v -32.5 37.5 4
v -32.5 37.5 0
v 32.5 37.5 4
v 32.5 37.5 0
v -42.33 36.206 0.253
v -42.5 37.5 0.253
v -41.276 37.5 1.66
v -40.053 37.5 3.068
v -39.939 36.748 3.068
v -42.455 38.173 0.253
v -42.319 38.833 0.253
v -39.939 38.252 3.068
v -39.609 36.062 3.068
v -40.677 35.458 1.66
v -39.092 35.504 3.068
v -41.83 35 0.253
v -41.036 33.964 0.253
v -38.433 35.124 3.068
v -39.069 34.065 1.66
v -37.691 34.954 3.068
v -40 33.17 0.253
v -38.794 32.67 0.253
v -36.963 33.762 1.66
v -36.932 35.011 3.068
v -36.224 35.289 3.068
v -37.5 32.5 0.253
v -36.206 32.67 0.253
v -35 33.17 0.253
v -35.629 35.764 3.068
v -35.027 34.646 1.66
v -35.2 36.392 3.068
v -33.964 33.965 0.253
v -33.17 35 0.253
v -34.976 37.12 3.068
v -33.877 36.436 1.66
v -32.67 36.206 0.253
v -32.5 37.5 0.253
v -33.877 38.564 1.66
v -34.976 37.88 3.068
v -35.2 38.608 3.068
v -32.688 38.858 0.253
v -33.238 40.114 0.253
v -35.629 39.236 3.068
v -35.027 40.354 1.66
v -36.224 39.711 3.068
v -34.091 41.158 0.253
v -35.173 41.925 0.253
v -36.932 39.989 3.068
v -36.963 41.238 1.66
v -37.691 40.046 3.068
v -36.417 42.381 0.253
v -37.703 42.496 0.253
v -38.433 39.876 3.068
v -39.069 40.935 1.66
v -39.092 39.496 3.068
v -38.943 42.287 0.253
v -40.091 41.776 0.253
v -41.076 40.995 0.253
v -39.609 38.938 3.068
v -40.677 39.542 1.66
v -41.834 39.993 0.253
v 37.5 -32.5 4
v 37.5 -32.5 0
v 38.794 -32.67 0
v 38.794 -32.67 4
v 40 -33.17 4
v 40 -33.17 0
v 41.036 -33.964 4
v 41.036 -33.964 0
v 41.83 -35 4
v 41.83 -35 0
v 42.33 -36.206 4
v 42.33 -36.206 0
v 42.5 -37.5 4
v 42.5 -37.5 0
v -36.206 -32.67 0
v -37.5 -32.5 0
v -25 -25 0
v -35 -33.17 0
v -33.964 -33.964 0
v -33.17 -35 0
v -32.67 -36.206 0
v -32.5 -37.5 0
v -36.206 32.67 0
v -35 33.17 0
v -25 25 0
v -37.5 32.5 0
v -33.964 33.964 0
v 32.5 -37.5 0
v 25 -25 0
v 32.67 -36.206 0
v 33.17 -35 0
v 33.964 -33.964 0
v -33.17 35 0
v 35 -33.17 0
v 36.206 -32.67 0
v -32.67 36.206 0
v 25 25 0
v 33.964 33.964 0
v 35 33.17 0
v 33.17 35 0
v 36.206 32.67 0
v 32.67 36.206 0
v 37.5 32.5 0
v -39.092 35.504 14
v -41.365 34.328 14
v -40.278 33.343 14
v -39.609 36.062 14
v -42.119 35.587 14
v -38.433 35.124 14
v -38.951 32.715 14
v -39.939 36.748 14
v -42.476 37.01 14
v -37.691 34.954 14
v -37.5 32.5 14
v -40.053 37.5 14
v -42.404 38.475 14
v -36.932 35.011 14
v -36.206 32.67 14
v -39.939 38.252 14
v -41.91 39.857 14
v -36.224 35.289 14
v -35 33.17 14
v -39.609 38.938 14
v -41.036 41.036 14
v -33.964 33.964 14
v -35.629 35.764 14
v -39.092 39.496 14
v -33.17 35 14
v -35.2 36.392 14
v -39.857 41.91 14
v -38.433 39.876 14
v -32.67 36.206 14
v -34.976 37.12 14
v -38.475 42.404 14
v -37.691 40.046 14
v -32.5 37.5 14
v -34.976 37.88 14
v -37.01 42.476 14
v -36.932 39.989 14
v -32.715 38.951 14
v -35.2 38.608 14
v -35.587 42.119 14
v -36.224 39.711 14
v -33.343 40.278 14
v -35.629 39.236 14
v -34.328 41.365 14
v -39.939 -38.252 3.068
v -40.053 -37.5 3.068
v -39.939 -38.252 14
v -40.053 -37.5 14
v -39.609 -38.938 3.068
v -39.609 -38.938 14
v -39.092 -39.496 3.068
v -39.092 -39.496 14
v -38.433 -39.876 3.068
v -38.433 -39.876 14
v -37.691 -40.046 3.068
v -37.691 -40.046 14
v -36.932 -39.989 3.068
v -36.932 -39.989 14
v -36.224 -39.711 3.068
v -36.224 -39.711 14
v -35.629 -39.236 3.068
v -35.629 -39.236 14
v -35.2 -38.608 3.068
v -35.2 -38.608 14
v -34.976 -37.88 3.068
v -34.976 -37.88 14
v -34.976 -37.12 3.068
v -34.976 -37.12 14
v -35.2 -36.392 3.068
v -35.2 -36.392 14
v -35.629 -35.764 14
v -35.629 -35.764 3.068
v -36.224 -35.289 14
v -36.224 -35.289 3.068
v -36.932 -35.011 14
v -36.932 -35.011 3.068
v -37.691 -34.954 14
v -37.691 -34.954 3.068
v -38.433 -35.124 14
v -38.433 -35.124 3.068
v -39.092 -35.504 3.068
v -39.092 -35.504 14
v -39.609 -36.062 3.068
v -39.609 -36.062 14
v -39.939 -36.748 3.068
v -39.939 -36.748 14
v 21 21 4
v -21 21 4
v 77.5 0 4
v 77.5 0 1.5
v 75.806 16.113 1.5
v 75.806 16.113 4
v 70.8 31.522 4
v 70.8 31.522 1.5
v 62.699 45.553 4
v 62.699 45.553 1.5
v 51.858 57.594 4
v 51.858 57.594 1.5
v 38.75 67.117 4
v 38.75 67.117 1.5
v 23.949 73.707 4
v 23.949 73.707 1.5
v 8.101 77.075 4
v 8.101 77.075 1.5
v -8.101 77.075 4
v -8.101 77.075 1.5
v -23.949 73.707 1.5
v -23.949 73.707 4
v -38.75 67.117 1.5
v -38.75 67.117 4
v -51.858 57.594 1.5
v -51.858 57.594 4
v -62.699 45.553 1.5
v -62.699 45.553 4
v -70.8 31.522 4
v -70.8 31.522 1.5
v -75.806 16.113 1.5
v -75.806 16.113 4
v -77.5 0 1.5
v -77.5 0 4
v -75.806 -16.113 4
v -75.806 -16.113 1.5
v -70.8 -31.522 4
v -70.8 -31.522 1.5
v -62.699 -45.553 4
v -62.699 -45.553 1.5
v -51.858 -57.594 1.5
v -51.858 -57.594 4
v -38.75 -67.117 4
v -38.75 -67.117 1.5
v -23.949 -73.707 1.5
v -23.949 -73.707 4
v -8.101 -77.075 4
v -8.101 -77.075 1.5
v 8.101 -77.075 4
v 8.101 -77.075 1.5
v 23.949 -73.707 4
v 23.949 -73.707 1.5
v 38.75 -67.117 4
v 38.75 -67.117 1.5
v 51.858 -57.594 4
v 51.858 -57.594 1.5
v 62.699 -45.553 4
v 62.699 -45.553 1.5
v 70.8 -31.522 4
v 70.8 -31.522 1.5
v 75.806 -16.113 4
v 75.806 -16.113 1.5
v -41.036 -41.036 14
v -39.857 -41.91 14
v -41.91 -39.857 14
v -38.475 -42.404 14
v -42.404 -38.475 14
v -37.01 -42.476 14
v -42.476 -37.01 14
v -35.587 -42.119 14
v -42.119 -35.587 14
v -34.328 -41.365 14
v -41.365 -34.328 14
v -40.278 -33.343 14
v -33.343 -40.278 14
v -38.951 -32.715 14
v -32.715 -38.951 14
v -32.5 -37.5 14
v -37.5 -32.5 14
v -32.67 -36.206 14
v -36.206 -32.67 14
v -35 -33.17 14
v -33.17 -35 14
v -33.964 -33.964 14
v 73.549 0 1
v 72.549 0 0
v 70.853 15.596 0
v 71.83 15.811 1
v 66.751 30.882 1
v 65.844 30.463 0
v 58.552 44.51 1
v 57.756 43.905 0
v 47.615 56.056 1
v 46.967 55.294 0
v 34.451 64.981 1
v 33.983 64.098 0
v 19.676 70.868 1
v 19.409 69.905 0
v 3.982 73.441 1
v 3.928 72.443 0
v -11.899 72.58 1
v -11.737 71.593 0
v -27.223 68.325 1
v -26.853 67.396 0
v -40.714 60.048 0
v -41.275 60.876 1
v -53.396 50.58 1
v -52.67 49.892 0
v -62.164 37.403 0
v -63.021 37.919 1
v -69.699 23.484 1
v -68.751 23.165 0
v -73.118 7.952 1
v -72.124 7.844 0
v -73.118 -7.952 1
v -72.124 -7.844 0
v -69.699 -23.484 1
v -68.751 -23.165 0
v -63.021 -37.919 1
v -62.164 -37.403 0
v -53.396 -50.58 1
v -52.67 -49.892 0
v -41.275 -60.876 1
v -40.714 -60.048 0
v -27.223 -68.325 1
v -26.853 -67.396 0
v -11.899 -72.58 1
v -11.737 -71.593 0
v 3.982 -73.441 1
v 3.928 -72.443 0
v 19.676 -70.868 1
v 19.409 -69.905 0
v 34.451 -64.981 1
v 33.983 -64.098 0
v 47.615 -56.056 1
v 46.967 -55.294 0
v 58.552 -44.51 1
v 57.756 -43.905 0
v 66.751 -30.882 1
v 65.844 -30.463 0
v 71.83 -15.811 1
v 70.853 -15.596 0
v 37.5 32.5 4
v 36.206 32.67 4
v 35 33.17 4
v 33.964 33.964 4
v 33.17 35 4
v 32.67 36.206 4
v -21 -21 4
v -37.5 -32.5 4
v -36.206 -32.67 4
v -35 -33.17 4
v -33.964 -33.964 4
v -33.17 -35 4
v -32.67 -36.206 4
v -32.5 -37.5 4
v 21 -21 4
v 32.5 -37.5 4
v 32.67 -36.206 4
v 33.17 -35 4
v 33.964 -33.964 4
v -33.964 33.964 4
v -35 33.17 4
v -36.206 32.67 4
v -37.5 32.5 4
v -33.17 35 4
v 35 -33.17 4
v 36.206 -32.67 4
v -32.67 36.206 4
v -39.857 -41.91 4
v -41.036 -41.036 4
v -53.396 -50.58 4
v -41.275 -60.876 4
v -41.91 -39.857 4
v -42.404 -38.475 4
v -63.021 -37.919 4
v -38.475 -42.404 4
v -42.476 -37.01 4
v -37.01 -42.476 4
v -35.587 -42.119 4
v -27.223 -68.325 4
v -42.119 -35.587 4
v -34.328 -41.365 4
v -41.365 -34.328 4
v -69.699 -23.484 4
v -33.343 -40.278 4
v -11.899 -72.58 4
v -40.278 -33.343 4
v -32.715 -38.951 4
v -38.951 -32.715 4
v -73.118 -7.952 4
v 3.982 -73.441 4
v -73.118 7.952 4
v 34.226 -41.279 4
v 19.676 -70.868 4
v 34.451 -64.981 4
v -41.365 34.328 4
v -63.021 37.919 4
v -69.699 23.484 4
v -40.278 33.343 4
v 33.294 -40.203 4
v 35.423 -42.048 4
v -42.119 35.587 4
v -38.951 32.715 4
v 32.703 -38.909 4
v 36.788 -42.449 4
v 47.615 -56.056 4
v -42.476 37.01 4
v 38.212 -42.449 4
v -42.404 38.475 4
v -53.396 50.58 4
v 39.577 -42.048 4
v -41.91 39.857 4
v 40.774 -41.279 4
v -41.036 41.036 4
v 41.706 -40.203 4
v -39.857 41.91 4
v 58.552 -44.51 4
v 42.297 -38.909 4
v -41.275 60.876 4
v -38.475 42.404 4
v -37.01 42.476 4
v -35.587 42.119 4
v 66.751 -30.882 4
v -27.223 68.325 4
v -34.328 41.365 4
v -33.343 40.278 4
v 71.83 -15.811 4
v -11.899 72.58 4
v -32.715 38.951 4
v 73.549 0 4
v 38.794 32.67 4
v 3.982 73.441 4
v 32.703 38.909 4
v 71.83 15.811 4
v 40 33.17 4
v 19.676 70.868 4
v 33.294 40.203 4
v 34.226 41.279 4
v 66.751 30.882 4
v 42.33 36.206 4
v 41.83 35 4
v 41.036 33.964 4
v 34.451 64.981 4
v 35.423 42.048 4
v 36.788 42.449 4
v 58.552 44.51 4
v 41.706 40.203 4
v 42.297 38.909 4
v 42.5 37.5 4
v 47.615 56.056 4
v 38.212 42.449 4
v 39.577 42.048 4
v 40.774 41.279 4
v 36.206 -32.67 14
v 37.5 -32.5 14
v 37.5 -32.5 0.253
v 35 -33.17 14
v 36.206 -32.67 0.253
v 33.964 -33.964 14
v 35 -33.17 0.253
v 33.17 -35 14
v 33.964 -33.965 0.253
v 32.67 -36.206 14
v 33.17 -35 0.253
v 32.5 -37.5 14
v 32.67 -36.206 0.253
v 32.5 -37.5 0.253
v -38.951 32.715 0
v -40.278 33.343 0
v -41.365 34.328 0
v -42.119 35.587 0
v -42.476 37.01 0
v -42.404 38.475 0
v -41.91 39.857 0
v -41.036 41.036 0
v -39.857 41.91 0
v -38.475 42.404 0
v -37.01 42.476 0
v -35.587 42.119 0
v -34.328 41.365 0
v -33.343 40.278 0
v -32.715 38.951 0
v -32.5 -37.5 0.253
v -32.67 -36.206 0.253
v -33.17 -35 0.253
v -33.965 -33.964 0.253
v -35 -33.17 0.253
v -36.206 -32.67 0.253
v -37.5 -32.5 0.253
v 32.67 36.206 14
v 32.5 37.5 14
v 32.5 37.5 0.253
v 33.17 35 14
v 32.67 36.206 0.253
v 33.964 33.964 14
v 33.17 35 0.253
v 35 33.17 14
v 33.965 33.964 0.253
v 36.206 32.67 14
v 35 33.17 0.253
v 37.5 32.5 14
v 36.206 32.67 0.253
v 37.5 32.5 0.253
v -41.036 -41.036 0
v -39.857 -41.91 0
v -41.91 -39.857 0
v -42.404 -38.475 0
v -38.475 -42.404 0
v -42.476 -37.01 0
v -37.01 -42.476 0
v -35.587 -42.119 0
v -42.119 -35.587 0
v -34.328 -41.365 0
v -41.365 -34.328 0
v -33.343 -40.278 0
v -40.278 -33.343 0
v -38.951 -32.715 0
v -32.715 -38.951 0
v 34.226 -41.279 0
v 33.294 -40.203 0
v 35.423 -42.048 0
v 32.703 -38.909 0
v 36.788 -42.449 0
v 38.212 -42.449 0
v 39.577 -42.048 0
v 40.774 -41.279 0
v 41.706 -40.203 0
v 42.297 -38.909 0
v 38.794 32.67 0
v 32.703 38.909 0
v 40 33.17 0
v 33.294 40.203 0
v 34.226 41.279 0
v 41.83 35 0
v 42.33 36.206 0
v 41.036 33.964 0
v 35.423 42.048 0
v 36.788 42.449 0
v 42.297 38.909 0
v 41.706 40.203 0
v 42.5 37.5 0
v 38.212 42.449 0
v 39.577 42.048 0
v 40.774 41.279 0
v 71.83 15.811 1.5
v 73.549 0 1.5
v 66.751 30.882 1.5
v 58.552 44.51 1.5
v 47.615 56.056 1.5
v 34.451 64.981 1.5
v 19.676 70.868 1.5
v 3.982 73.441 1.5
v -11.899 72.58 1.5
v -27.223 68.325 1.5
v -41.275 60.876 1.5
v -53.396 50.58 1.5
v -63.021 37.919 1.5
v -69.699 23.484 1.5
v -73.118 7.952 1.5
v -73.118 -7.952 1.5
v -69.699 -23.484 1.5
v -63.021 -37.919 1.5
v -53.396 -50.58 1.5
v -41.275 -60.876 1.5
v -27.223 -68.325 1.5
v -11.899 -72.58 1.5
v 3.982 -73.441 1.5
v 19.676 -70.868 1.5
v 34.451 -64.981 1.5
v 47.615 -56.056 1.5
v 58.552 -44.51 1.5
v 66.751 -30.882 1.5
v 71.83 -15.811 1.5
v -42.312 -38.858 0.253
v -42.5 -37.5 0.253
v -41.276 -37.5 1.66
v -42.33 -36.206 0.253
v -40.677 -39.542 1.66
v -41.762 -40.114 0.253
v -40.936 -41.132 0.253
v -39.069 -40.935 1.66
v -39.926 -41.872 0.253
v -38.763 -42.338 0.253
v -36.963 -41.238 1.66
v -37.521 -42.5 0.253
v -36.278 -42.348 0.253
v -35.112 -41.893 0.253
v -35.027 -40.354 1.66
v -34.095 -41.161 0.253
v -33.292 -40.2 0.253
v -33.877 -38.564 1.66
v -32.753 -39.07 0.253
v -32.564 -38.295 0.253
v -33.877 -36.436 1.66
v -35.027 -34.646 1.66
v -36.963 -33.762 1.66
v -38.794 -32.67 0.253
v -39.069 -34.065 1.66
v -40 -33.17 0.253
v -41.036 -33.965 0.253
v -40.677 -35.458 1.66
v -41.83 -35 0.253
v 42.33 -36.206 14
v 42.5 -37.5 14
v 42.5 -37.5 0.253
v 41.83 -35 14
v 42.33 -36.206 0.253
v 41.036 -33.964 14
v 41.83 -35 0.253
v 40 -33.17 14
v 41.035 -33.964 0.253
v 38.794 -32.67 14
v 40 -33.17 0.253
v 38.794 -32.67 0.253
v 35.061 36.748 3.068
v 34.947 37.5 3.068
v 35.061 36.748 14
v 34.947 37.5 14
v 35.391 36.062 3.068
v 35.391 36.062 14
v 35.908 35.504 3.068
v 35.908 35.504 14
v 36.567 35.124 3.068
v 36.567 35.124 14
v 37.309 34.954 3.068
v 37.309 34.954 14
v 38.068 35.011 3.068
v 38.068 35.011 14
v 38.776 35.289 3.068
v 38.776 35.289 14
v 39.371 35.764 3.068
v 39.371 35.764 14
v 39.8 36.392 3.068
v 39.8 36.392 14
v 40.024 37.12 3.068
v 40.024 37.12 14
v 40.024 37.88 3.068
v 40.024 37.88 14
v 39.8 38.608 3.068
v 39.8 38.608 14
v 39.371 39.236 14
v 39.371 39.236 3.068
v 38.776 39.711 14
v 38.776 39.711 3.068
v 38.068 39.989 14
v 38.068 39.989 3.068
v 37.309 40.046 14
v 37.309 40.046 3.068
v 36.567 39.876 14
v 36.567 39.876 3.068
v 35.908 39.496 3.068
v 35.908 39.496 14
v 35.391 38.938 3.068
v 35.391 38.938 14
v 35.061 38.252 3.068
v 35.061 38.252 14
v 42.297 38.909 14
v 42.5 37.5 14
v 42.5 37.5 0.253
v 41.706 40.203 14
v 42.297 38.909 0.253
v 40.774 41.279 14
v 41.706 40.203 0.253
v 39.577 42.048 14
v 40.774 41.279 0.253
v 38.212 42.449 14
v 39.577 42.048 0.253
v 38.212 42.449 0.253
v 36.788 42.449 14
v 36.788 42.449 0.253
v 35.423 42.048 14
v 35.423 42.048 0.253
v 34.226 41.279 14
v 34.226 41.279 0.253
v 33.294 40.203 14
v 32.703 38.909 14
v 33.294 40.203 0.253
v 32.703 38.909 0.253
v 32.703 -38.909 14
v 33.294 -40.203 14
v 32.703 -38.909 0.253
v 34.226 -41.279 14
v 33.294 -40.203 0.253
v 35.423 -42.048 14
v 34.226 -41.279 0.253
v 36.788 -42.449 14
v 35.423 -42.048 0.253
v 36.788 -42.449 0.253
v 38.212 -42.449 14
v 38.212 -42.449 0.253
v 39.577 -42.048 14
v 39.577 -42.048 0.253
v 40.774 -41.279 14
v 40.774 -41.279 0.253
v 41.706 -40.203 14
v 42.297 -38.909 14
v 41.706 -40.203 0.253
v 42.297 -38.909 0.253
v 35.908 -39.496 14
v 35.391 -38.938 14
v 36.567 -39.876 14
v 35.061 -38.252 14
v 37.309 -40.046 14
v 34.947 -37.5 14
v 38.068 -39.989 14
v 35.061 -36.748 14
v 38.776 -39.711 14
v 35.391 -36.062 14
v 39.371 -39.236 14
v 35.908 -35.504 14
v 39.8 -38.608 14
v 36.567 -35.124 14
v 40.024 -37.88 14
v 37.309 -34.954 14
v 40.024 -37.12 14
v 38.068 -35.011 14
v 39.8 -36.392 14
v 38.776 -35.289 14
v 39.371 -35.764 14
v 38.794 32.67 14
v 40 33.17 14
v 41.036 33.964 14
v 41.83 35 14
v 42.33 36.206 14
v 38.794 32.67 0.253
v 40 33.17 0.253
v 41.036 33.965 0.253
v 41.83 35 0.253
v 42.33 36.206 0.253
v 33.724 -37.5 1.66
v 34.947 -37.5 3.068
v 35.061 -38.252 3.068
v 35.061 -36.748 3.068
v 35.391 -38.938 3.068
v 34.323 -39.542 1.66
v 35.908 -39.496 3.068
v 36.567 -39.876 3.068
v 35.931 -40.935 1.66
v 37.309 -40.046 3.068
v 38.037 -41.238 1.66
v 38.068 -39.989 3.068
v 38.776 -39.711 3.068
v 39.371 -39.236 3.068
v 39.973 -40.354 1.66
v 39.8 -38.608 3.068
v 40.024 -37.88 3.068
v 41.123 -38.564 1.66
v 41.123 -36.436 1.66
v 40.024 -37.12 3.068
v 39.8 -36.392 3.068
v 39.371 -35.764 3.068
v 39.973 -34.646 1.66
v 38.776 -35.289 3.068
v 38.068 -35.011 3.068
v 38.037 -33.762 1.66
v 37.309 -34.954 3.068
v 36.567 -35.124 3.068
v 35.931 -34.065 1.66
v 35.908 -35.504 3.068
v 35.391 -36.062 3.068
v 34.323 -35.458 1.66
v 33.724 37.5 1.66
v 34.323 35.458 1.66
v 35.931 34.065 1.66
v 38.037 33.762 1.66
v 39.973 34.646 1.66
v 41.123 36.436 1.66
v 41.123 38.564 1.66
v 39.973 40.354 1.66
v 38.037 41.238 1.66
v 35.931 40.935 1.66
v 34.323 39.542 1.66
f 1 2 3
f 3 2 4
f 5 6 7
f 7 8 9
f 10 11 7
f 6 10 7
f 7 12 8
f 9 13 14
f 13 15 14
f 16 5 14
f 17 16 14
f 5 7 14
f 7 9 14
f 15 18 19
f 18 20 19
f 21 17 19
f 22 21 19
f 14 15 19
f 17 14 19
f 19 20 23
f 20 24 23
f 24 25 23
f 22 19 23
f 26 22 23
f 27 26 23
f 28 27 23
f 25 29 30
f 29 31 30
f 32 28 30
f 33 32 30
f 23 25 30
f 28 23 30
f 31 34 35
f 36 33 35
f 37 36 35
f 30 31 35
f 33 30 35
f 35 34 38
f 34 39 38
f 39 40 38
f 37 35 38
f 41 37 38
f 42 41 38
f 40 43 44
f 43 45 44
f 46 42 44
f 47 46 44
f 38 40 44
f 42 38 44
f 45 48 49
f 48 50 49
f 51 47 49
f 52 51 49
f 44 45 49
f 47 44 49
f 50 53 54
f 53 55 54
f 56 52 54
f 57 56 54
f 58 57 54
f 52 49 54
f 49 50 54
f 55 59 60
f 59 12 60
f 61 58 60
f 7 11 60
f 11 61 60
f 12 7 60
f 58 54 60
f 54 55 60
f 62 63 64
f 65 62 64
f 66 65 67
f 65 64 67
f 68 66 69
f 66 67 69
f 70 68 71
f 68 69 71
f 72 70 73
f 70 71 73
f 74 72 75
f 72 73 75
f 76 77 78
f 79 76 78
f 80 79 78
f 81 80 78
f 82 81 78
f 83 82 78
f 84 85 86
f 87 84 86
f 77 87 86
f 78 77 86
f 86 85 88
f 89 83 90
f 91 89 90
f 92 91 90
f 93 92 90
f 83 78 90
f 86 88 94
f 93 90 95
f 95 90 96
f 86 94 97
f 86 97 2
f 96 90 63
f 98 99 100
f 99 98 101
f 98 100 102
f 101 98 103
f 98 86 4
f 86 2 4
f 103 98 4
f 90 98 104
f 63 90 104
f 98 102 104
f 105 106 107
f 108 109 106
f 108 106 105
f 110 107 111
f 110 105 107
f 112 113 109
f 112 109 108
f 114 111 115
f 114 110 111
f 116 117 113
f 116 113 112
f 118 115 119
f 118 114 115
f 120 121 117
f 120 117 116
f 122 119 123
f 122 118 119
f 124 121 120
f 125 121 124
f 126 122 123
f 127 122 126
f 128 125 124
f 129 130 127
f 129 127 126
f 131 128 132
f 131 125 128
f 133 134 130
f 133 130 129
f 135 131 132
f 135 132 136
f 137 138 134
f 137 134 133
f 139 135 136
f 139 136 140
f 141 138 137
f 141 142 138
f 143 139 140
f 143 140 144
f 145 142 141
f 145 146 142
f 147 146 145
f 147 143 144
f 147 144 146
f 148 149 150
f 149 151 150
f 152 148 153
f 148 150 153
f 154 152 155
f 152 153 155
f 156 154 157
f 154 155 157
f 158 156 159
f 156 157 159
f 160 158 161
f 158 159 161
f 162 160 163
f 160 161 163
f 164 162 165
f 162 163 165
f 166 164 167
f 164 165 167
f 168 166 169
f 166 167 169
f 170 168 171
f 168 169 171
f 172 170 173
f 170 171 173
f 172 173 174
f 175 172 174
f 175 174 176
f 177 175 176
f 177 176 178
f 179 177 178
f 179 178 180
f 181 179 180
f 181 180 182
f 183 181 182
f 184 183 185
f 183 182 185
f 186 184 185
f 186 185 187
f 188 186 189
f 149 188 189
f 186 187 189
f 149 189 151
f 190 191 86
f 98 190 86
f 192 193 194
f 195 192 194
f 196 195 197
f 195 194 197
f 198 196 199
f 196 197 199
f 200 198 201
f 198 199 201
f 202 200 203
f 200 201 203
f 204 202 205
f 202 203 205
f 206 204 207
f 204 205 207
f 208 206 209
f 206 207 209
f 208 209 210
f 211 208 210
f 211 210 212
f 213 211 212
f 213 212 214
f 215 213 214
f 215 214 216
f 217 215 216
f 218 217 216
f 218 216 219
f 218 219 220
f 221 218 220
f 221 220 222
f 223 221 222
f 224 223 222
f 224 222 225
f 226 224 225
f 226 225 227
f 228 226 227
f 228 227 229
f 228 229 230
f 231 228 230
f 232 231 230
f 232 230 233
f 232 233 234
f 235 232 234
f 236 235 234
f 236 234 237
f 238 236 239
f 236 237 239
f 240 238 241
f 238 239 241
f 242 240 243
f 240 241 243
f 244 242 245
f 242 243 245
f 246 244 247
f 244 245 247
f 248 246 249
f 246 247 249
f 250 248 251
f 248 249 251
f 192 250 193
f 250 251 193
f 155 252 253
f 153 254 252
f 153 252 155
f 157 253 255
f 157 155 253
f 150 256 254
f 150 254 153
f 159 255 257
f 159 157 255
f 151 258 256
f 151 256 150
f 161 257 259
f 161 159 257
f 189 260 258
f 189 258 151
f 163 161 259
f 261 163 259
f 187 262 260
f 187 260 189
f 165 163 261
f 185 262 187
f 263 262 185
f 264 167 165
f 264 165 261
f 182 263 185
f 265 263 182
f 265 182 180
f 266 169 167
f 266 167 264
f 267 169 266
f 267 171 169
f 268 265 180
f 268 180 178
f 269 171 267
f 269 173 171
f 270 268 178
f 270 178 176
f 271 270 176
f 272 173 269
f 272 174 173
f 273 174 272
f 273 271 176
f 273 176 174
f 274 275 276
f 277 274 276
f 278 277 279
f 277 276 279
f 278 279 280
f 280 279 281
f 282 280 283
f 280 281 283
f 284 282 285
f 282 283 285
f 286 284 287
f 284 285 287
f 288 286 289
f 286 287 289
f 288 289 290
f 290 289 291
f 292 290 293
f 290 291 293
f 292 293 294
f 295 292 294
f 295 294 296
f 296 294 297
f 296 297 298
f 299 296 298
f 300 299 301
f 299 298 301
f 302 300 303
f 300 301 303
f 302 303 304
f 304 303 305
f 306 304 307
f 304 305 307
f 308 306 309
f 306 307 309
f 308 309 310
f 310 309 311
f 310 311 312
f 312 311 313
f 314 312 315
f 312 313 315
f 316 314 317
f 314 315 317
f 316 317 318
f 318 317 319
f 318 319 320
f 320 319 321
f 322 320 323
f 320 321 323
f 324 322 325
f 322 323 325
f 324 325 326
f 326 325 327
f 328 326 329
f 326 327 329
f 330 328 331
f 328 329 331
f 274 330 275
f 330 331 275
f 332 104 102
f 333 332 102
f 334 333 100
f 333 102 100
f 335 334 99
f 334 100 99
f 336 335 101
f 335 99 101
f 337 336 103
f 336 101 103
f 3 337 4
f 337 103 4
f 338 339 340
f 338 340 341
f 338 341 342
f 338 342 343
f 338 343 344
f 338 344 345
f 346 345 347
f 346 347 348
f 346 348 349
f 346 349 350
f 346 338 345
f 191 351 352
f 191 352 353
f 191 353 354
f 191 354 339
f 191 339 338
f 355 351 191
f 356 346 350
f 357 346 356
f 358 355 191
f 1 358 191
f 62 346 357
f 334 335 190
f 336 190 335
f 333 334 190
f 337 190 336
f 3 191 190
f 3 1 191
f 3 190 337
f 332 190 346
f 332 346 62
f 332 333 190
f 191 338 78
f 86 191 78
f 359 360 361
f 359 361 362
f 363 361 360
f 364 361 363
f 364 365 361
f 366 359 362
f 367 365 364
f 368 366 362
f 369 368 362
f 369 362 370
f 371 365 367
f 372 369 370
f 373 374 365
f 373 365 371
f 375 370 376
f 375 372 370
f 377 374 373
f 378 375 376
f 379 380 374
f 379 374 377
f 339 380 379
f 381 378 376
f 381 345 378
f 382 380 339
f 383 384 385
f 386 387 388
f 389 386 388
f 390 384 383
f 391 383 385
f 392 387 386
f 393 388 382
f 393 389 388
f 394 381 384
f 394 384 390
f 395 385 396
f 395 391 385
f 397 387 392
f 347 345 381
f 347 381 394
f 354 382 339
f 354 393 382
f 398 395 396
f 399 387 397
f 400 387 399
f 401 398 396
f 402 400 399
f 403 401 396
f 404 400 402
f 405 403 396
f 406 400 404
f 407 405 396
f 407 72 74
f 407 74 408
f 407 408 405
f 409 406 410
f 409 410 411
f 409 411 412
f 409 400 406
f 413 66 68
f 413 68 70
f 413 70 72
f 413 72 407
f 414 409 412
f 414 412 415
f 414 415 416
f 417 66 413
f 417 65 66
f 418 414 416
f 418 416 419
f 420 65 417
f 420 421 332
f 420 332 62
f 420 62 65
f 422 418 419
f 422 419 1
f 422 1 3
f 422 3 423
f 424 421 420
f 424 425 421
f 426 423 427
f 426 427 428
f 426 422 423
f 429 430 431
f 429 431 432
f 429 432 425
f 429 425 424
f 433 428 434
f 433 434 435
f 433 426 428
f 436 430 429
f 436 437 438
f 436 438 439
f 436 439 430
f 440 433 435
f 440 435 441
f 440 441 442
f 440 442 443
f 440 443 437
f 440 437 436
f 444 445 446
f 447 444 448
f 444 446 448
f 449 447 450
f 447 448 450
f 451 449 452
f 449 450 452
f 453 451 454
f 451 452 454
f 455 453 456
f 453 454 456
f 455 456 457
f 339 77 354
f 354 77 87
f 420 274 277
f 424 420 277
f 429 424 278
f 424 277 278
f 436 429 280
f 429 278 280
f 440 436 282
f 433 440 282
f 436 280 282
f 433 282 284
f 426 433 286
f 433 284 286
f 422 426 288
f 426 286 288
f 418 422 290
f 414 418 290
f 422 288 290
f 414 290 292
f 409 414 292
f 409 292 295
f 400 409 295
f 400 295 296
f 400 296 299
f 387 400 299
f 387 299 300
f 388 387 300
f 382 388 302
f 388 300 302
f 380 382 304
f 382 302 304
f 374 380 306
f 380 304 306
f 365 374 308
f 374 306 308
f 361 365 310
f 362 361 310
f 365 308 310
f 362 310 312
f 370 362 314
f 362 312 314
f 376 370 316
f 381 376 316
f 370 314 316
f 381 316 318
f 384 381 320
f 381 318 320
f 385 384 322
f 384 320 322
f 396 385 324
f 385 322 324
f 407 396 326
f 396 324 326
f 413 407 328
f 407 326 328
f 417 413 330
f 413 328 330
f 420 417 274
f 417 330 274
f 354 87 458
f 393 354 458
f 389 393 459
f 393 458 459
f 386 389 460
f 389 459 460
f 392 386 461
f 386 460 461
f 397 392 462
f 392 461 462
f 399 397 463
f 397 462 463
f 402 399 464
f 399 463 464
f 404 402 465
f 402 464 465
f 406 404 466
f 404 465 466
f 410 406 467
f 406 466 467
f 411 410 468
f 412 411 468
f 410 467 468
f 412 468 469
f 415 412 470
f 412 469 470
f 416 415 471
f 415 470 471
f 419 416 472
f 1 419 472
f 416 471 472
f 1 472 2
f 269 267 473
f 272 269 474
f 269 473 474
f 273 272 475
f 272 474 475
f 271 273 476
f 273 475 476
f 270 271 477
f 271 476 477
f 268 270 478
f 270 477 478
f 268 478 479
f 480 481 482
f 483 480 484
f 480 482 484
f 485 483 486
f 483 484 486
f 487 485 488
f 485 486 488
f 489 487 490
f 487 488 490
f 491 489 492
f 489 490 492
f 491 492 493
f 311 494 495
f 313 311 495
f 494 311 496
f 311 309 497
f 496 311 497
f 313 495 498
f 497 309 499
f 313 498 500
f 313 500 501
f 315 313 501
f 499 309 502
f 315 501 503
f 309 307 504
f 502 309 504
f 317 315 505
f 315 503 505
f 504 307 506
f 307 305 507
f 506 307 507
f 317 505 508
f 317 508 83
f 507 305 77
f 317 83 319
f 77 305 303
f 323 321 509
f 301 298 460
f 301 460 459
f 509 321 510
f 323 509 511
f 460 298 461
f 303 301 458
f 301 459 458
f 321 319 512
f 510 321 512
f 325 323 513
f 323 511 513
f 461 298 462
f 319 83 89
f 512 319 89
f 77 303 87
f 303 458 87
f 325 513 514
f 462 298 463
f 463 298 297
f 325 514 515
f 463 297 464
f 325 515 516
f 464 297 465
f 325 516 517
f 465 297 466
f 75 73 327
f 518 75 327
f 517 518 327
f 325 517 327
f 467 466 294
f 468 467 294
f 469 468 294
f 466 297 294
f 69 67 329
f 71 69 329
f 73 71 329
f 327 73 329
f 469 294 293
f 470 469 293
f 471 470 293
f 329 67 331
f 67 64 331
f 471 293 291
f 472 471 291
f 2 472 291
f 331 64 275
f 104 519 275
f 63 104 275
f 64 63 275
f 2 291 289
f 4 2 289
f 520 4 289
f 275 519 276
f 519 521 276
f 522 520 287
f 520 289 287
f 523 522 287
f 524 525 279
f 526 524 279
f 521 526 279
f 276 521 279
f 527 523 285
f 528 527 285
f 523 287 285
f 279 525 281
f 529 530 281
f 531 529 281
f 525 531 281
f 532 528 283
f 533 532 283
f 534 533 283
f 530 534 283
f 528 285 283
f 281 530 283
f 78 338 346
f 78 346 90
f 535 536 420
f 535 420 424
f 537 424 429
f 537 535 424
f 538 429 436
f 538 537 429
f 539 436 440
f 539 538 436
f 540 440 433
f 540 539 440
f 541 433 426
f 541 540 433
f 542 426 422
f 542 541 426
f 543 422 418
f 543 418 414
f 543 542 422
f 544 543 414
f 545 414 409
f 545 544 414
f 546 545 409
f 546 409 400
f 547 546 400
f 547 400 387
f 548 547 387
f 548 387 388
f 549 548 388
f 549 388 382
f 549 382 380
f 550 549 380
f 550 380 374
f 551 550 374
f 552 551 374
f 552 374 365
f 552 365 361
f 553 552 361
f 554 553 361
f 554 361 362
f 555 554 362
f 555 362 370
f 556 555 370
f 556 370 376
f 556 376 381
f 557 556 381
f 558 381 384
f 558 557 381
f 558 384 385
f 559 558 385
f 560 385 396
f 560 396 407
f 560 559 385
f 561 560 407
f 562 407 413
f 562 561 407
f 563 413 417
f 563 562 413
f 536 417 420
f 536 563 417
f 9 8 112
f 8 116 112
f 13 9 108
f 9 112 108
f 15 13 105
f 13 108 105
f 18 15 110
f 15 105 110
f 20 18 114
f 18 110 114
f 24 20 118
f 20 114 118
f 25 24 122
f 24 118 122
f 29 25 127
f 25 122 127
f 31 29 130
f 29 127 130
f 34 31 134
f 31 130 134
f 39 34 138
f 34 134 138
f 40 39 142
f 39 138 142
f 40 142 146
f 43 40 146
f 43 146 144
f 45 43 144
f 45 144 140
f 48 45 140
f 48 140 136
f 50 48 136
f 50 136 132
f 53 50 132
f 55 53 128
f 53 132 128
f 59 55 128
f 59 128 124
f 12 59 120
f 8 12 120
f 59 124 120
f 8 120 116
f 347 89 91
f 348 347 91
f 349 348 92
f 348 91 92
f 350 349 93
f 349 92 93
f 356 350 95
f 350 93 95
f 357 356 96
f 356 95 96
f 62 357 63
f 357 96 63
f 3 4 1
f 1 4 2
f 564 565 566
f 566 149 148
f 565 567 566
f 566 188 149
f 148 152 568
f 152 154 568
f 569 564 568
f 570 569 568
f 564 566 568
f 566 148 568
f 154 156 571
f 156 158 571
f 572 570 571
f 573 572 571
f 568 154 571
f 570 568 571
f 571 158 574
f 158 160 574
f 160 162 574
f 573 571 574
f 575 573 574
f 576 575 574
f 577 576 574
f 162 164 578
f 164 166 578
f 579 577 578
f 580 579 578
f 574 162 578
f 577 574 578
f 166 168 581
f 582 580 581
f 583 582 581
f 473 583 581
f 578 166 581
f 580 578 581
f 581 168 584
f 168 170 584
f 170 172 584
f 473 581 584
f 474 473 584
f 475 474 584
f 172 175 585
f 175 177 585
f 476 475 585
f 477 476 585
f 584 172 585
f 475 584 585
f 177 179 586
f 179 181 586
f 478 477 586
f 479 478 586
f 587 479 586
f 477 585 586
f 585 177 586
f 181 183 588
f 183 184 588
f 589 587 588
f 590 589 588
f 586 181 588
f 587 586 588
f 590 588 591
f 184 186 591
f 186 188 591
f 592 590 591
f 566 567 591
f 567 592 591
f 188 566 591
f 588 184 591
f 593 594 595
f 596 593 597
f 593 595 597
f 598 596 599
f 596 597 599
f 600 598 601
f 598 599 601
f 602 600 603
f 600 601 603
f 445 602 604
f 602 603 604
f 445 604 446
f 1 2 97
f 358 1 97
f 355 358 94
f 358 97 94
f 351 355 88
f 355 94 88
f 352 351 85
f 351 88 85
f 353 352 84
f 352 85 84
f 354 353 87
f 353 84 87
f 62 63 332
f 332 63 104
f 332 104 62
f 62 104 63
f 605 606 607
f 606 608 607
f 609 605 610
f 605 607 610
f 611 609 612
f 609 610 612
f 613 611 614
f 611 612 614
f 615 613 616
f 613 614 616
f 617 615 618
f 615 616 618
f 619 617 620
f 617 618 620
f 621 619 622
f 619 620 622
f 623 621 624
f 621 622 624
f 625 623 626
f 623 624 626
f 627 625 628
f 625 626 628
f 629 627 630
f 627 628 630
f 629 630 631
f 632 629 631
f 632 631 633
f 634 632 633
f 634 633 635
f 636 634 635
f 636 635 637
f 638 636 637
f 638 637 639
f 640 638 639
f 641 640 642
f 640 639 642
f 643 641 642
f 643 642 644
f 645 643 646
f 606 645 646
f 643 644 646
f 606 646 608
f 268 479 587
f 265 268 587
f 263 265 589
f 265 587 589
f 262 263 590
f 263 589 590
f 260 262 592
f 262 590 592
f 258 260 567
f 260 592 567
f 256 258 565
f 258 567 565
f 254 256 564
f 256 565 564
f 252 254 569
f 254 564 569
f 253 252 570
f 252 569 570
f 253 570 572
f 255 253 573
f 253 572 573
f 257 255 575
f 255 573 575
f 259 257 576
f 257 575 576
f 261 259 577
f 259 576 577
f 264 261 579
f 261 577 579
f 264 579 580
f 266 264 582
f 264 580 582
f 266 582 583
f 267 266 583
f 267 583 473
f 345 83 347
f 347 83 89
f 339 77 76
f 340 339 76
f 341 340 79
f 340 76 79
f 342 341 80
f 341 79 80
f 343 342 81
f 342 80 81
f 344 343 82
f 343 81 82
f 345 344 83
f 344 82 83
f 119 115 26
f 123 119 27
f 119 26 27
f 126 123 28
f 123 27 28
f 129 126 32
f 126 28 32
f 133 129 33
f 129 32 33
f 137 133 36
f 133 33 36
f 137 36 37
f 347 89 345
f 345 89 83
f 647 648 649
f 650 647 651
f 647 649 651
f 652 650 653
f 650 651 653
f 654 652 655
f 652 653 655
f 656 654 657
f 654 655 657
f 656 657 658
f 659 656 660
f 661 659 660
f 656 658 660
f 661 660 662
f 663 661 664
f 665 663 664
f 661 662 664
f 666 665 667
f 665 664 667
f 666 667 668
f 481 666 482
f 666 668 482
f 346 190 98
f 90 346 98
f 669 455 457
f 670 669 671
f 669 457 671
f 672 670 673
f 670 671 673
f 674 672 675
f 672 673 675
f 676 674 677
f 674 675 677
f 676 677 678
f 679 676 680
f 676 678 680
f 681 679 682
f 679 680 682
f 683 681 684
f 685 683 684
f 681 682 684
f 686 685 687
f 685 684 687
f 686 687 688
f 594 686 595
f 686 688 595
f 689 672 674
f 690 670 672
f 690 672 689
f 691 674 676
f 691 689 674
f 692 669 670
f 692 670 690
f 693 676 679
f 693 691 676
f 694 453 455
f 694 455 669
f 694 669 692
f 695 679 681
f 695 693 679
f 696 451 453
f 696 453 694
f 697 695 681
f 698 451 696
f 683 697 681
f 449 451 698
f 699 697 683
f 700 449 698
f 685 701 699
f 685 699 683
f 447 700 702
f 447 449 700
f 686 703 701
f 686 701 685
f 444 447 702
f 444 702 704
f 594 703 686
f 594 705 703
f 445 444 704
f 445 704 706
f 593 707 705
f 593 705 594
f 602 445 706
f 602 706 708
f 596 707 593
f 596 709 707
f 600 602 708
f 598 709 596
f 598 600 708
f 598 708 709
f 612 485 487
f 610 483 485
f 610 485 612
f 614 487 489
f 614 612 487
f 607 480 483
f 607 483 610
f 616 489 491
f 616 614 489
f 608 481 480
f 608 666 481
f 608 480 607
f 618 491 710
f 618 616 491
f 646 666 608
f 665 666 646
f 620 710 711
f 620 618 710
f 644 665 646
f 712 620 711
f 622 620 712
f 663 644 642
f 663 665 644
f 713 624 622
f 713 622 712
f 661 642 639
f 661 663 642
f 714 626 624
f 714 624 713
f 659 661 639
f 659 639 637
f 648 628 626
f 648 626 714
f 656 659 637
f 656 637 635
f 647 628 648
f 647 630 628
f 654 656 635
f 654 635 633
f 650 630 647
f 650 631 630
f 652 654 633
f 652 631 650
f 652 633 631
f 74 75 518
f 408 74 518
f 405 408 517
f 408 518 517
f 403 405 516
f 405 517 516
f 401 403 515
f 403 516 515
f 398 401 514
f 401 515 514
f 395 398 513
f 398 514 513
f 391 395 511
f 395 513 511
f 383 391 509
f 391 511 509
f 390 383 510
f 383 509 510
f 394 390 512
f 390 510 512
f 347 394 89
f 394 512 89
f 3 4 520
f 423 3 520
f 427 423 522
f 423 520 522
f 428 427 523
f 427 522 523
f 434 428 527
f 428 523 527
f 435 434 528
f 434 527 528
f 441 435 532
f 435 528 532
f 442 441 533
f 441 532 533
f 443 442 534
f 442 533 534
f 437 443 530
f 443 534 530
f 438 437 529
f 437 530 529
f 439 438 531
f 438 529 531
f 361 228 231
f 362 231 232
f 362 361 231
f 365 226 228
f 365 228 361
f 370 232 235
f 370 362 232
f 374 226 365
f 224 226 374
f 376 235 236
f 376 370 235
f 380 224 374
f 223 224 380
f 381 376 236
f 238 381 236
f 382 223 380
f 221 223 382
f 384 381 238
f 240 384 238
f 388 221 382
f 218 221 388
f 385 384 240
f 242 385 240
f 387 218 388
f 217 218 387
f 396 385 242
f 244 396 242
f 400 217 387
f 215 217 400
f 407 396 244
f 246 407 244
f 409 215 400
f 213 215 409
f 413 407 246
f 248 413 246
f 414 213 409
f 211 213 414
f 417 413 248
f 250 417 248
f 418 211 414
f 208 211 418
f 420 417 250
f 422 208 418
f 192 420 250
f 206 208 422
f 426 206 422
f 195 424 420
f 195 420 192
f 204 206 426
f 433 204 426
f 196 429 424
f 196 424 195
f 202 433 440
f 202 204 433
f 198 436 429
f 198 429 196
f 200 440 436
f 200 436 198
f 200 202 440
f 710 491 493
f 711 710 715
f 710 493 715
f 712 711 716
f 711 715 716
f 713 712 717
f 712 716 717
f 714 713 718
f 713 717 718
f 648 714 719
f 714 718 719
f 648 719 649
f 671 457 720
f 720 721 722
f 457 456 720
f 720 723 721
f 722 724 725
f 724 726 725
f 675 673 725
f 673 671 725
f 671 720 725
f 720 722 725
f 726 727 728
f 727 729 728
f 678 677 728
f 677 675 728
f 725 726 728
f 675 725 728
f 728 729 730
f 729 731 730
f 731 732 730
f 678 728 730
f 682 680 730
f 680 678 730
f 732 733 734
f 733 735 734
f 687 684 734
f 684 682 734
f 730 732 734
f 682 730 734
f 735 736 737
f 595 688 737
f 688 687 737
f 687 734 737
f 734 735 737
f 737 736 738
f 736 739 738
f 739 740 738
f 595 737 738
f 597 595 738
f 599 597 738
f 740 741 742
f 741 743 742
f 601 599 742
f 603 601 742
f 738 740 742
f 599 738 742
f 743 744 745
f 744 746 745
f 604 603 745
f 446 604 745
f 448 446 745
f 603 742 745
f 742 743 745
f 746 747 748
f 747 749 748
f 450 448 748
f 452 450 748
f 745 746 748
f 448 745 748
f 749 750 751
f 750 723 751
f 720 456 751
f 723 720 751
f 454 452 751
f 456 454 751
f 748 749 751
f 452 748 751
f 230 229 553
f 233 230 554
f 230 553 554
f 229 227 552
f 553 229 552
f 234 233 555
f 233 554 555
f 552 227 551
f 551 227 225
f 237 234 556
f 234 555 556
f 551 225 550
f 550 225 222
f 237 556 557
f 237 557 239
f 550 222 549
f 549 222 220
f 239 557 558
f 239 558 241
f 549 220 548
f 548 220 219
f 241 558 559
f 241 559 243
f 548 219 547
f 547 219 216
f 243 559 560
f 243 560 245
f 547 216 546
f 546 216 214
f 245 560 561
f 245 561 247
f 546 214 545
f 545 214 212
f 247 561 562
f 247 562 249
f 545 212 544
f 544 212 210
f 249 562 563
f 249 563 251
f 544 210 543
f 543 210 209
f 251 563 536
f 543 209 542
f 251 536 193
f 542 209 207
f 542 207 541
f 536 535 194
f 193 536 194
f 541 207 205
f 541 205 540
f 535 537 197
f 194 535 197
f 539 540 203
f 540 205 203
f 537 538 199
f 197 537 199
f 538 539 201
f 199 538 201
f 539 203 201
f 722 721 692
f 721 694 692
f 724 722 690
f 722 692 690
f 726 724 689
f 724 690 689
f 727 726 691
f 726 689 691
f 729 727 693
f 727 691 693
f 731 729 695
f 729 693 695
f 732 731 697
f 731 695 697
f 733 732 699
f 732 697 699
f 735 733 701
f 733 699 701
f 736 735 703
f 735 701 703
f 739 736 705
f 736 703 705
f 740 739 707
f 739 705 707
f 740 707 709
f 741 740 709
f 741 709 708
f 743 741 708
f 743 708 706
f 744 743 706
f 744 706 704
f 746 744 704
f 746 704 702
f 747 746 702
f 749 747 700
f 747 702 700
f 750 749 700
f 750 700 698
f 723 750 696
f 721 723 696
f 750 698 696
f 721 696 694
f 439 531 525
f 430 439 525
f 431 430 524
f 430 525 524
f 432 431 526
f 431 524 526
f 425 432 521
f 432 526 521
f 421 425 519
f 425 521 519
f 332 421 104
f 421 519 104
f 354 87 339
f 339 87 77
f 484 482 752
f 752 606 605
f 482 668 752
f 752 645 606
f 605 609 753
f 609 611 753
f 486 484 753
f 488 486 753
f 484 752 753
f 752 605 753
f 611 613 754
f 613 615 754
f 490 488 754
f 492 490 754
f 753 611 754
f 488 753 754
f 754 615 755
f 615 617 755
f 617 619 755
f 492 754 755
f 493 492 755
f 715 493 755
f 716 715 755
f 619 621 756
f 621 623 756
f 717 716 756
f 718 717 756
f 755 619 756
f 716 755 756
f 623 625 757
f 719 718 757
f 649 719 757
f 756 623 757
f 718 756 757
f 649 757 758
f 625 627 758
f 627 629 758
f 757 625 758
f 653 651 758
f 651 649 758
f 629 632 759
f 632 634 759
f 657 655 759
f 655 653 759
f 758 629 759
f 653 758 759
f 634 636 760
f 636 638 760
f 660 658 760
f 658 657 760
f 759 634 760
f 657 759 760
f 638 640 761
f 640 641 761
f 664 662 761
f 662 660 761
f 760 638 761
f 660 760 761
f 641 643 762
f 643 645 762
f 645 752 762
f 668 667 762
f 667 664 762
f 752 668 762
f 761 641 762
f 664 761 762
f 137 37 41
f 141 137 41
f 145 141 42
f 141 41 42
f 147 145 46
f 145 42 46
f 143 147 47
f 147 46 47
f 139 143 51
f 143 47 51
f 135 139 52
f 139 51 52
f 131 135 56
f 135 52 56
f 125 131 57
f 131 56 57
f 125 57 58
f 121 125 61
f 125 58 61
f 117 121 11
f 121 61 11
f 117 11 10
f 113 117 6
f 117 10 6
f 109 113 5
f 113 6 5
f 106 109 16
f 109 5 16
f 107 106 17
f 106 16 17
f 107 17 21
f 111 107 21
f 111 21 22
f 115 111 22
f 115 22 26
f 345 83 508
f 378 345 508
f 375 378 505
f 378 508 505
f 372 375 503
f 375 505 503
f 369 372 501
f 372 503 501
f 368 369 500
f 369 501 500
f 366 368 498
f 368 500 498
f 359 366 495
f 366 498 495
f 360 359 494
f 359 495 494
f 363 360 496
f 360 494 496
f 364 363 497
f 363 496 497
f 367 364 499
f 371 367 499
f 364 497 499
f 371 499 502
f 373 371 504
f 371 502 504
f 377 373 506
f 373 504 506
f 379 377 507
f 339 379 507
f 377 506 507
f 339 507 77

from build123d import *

# Parameters (mm, degrees)
F1_DEPTH         = 14
F0_W             = 40
F0_H             = 40
F2_DEPTH         = 4
F0_R             = 77.5
F0_R_2           = 73.549080942
F3_DEPTH         = 4
F4_DEPTH         = 4
F5_DEPTH         = 1.5
F6_D             = 5.1054
F6_CSINK_D       = 10.4394
F6_CSINK_ANGLE   = 82
F6_2_D           = 5.1054
F6_2_CSINK_D     = 10.4394
F6_2_CSINK_ANGLE = 82
F6_3_D           = 5.1054
F6_3_CSINK_D     = 10.4394
F6_3_CSINK_ANGLE = 82
F6_4_D           = 5.1054
F6_4_CSINK_D     = 10.4394
F6_4_CSINK_ANGLE = 82
F7_T1_DEPTH      = 40
F7_T3_DEPTH      = 40
F7_T9_DEPTH      = 52.8584149398
F7_T13_DEPTH     = 52.8584149398
F7_T20_DEPTH     = 52.8584149398
F7_T24_DEPTH     = 52.8584149398
F7_T31_DEPTH     = 52.8584149398
F7_T35_DEPTH     = 52.8584149398
F7_T42_DEPTH     = 52.8584149398
F7_T46_DEPTH     = 52.8584149398
F8_SIZE          = 1


# Not quite as in the source:
# - a fillet or chamfer that OpenCascade refuses, or shapes differently, is made with other operations: its cross-section is extruded or revolved along the edge and cut away or added


with BuildPart() as f1:
    # F0 (on Top) → F1 (new body)
    with BuildSketch(Plane.XY):
        with BuildLine():
            ThreePointArc((-32.5, -37.5), (-33.9644660941, -33.9644660941), (-37.5, -32.5))
            Line((-37.5, -32.5), (-37.5, -37.5))
            Line((-37.5, -37.5), (-32.5, -37.5))
        make_face()
        with BuildLine():
            Line((-37.5, -37.5), (-37.5, -32.5))
            ThreePointArc((-37.5, -32.5), (-41.0355339059, -41.0355339059), (-32.5, -37.5))
            Line((-32.5, -37.5), (-37.5, -37.5))
        make_face()
    extrude(amount=F1_DEPTH)

    # F6 (through all)
    with Locations(Plane(origin=(0, 0, 0), x_dir=(1, 0, 0), z_dir=(0, 0, -1))):
        with Locations((-37.5, -37.5), (37.5, -37.5), (37.5, 37.5), (-37.5, 37.5)):
            CounterSinkHole(F6_D / 2, F6_CSINK_D / 2, counter_sink_angle=F6_CSINK_ANGLE)


with BuildPart() as f1b:
    # F0 (on Top) → F1, piece 2 (new body)
    with BuildSketch(Plane.XY):
        with BuildLine():
            ThreePointArc((-37.5, 32.5), (-33.9644660941, 33.9644660941), (-32.5, 37.5))
            Line((-32.5, 37.5), (-37.5, 37.5))
            Line((-37.5, 37.5), (-37.5, 32.5))
        make_face()
        with BuildLine():
            Line((-37.5, 37.5), (-32.5, 37.5))
            ThreePointArc((-32.5, 37.5), (-41.0355339059, 41.0355339059), (-37.5, 32.5))
            Line((-37.5, 32.5), (-37.5, 37.5))
        make_face()
    extrude(amount=F1_DEPTH)

    # F6#2 (through all)
    with Locations(Plane(origin=(0, 0, 0), x_dir=(1, 0, 0), z_dir=(0, 0, -1))):
        with Locations((-37.5, -37.5), (37.5, -37.5), (37.5, 37.5), (-37.5, 37.5)):
            CounterSinkHole(F6_2_D / 2, F6_2_CSINK_D / 2, counter_sink_angle=F6_2_CSINK_ANGLE)


with BuildPart() as f1c:
    # F0 (on Top) → F1, piece 3 (new body)
    with BuildSketch(Plane.XY):
        with BuildLine():
            Line((37.5, -37.5), (37.5, -32.5))
            ThreePointArc((37.5, -32.5), (33.9644660941, -33.9644660941), (32.5, -37.5))
            Line((32.5, -37.5), (37.5, -37.5))
        make_face()
        with BuildLine():
            ThreePointArc((42.5, -37.5), (41.0355339059, -33.9644660941), (37.5, -32.5))
            Line((37.5, -32.5), (37.5, -37.5))
            Line((37.5, -37.5), (32.5, -37.5))
            ThreePointArc((32.5, -37.5), (37.5, -42.5), (42.5, -37.5))
        make_face()
    extrude(amount=F1_DEPTH)

    # F6#3 (through all)
    with Locations(Plane(origin=(0, 0, 0), x_dir=(1, 0, 0), z_dir=(0, 0, -1))):
        with Locations((-37.5, -37.5), (37.5, -37.5), (37.5, 37.5), (-37.5, 37.5)):
            CounterSinkHole(F6_3_D / 2, F6_3_CSINK_D / 2, counter_sink_angle=F6_3_CSINK_ANGLE)


with BuildPart() as f1d:
    # F0 (on Top) → F1, piece 4 (new body)
    with BuildSketch(Plane.XY):
        with BuildLine():
            Line((37.5, 37.5), (32.5, 37.5))
            ThreePointArc((32.5, 37.5), (33.9644660941, 33.9644660941), (37.5, 32.5))
            Line((37.5, 32.5), (37.5, 37.5))
        make_face()
        with BuildLine():
            ThreePointArc((42.5, 37.5), (37.5, 42.5), (32.5, 37.5))
            Line((32.5, 37.5), (37.5, 37.5))
            Line((37.5, 37.5), (37.5, 32.5))
            ThreePointArc((37.5, 32.5), (41.0355339059, 33.9644660941), (42.5, 37.5))
        make_face()
    extrude(amount=F1_DEPTH)

    # F6#4 (through all)
    with Locations(Plane(origin=(0, 0, 0), x_dir=(1, 0, 0), z_dir=(0, 0, -1))):
        with Locations((-37.5, -37.5), (37.5, -37.5), (37.5, 37.5), (-37.5, 37.5)):
            CounterSinkHole(F6_4_D / 2, F6_4_CSINK_D / 2, counter_sink_angle=F6_4_CSINK_ANGLE)


with BuildPart() as f2:
    # F0 (on Top) → F2 (new body)
    with BuildSketch(Plane.XY):
        with BuildLine():
            Line((32.5, 37.5), (-32.5, 37.5))
            ThreePointArc((-32.5, 37.5), (-33.9644660941, 33.9644660941), (-37.5, 32.5))
            Line((-37.5, 32.5), (-37.5, -32.5))
            ThreePointArc((-37.5, -32.5), (-33.9644660941, -33.9644660941), (-32.5, -37.5))
            Line((-32.5, -37.5), (32.5, -37.5))
            ThreePointArc((32.5, -37.5), (33.9644660941, -33.9644660941), (37.5, -32.5))
            Line((37.5, -32.5), (37.5, 32.5))
            ThreePointArc((37.5, 32.5), (33.9644660941, 33.9644660941), (32.5, 37.5))
        make_face()
        Rectangle(F0_W, F0_H, mode=Mode.SUBTRACT)
    extrude(amount=F2_DEPTH)

    # F7: chamfer of 5 on 4 edges, made by hand

    # F7_s2 → F7_t1 (cut)
    with BuildSketch(Plane.YZ.offset(-20)):
        Polygon((-20, 5), (-25, 0), (-20, 0), align=None)
        Polygon((20, 5), (25, 0), (20, 0), align=None)
    extrude(amount=F7_T1_DEPTH, mode=Mode.SUBTRACT)

    # F7_s4 → F7_t3 (cut)
    with BuildSketch(Plane.XZ.offset(-20)):
        Polygon((20, 5), (25, 0), (20, 0), align=None)
        Polygon((-20, 5), (-25, 0), (-20, 0), align=None)
    extrude(amount=F7_T3_DEPTH, mode=Mode.SUBTRACT)


with BuildPart() as f3:
    # F0 (on Top) → F3 (new body)
    with BuildSketch(Plane.XY):
        Circle(F0_R)
        Circle(F0_R_2, mode=Mode.SUBTRACT)
    extrude(amount=F3_DEPTH)

    # F0 (on Top) → F5 (cut)
    with BuildSketch(Plane.XY):
        Circle(F0_R)
        Circle(F0_R_2, mode=Mode.SUBTRACT)
    extrude(amount=F5_DEPTH, mode=Mode.SUBTRACT)


with BuildPart() as f4:
    # F0 (on Top) → F4 (new body)
    with BuildSketch(Plane.XY):
        Circle(F0_R_2)
        with BuildLine():
            ThreePointArc((-37.5, 32.5), (-41.0355339059, 41.0355339059), (-32.5, 37.5))
            Line((-32.5, 37.5), (32.5, 37.5))
            ThreePointArc((32.5, 37.5), (37.5, 42.5), (42.5, 37.5))
            ThreePointArc((42.5, 37.5), (41.0355339059, 33.9644660941), (37.5, 32.5))
            Line((37.5, 32.5), (37.5, -32.5))
            ThreePointArc((37.5, -32.5), (41.0355339059, -33.9644660941), (42.5, -37.5))
            ThreePointArc((42.5, -37.5), (37.5, -42.5), (32.5, -37.5))
            Line((32.5, -37.5), (-32.5, -37.5))
            ThreePointArc((-32.5, -37.5), (-41.0355339059, -41.0355339059), (-37.5, -32.5))
            Line((-37.5, -32.5), (-37.5, 32.5))
        make_face(mode=Mode.SUBTRACT)
    extrude(amount=F4_DEPTH)

    # F8
    f8_edges = [f4.edges().sort_by_distance(p)[0] for p in [
        (-73.549081, 0, 0),
    ]]
    chamfer(f8_edges, length=F8_SIZE)


with BuildPart() as f7_tool7:
    # F7_s8 → F7_t9 (new body)
    with BuildSketch(Plane.XZ.offset(-20)):
        Polygon((20, 5), (25, 0), (20, 0), align=None)
    extrude(amount=F7_T9_DEPTH)

    split(bisect_by=Plane.XZ.offset(20), keep=Keep.TOP)


with BuildPart() as f7_tool11:
    # F7_s12 → F7_t13 (new body)
    with BuildSketch(Plane.YZ.offset(32.8584149398)):
        Polygon((-20, 5), (-25, 0), (-20, 0), align=None)
    extrude(amount=-F7_T13_DEPTH)

    split(bisect_by=Plane.YZ.offset(20), keep=Keep.TOP)


with BuildPart() as f7_tool7_1:
    add(f7_tool7.part)

    # F7_t15: intersect F7_tool11
    add(f7_tool11.part, mode=Mode.INTERSECT)


with BuildPart() as f2_1:
    add(f2.part)

    # F7_t5: cut F7_tool7
    add(f7_tool7_1.part, mode=Mode.SUBTRACT)


with BuildPart() as f7_tool18:
    # F7_s19 → F7_t20 (new body)
    with BuildSketch(Plane.YZ.offset(20)):
        Polygon((-20, 5), (-25, 0), (-20, 0), align=None)
    extrude(amount=-F7_T20_DEPTH)

    split(bisect_by=Plane.YZ.offset(-20), keep=Keep.BOTTOM)


with BuildPart() as f7_tool22:
    # F7_s23 → F7_t24 (new body)
    with BuildSketch(Plane.XZ.offset(32.8584149398)):
        Polygon((-20, 5), (-25, 0), (-20, 0), align=None)
    extrude(amount=-F7_T24_DEPTH)

    split(bisect_by=Plane.XZ.offset(20), keep=Keep.TOP)


with BuildPart() as f7_tool18_1:
    add(f7_tool18.part)

    # F7_t26: intersect F7_tool22
    add(f7_tool22.part, mode=Mode.INTERSECT)


with BuildPart() as f2_2:
    add(f2_1.part)

    # F7_t16: cut F7_tool18
    add(f7_tool18_1.part, mode=Mode.SUBTRACT)


with BuildPart() as f7_tool29:
    # F7_s30 → F7_t31 (new body)
    with BuildSketch(Plane.XZ.offset(-32.8584149398)):
        Polygon((20, 5), (25, 0), (20, 0), align=None)
    extrude(amount=F7_T31_DEPTH)

    split(bisect_by=Plane.XZ.offset(-20), keep=Keep.BOTTOM)


with BuildPart() as f7_tool33:
    # F7_s34 → F7_t35 (new body)
    with BuildSketch(Plane.YZ.offset(-20)):
        Polygon((20, 5), (25, 0), (20, 0), align=None)
    extrude(amount=F7_T35_DEPTH)

    split(bisect_by=Plane.YZ.offset(20), keep=Keep.TOP)


with BuildPart() as f7_tool29_1:
    add(f7_tool29.part)

    # F7_t37: intersect F7_tool33
    add(f7_tool33.part, mode=Mode.INTERSECT)


with BuildPart() as f2_3:
    add(f2_2.part)

    # F7_t27: cut F7_tool29
    add(f7_tool29_1.part, mode=Mode.SUBTRACT)


with BuildPart() as f7_tool40:
    # F7_s41 → F7_t42 (new body)
    with BuildSketch(Plane.XZ.offset(20)):
        Polygon((-20, 5), (-25, 0), (-20, 0), align=None)
    extrude(amount=-F7_T42_DEPTH)

    split(bisect_by=Plane.XZ.offset(-20), keep=Keep.BOTTOM)


with BuildPart() as f7_tool44:
    # F7_s45 → F7_t46 (new body)
    with BuildSketch(Plane.YZ.offset(-32.8584149398)):
        Polygon((20, 5), (25, 0), (20, 0), align=None)
    extrude(amount=F7_T46_DEPTH)

    split(bisect_by=Plane.YZ.offset(-20), keep=Keep.BOTTOM)


with BuildPart() as f7_tool40_1:
    add(f7_tool40.part)

    # F7_t48: intersect F7_tool44
    add(f7_tool44.part, mode=Mode.INTERSECT)


with BuildPart() as f2_4:
    add(f2_3.part)

    # F7_t38: cut F7_tool40
    add(f7_tool40_1.part, mode=Mode.SUBTRACT)


solid = Compound([f1.part, f1b.part, f1c.part, f1d.part, f3.part, f4.part, f2_4.part])
